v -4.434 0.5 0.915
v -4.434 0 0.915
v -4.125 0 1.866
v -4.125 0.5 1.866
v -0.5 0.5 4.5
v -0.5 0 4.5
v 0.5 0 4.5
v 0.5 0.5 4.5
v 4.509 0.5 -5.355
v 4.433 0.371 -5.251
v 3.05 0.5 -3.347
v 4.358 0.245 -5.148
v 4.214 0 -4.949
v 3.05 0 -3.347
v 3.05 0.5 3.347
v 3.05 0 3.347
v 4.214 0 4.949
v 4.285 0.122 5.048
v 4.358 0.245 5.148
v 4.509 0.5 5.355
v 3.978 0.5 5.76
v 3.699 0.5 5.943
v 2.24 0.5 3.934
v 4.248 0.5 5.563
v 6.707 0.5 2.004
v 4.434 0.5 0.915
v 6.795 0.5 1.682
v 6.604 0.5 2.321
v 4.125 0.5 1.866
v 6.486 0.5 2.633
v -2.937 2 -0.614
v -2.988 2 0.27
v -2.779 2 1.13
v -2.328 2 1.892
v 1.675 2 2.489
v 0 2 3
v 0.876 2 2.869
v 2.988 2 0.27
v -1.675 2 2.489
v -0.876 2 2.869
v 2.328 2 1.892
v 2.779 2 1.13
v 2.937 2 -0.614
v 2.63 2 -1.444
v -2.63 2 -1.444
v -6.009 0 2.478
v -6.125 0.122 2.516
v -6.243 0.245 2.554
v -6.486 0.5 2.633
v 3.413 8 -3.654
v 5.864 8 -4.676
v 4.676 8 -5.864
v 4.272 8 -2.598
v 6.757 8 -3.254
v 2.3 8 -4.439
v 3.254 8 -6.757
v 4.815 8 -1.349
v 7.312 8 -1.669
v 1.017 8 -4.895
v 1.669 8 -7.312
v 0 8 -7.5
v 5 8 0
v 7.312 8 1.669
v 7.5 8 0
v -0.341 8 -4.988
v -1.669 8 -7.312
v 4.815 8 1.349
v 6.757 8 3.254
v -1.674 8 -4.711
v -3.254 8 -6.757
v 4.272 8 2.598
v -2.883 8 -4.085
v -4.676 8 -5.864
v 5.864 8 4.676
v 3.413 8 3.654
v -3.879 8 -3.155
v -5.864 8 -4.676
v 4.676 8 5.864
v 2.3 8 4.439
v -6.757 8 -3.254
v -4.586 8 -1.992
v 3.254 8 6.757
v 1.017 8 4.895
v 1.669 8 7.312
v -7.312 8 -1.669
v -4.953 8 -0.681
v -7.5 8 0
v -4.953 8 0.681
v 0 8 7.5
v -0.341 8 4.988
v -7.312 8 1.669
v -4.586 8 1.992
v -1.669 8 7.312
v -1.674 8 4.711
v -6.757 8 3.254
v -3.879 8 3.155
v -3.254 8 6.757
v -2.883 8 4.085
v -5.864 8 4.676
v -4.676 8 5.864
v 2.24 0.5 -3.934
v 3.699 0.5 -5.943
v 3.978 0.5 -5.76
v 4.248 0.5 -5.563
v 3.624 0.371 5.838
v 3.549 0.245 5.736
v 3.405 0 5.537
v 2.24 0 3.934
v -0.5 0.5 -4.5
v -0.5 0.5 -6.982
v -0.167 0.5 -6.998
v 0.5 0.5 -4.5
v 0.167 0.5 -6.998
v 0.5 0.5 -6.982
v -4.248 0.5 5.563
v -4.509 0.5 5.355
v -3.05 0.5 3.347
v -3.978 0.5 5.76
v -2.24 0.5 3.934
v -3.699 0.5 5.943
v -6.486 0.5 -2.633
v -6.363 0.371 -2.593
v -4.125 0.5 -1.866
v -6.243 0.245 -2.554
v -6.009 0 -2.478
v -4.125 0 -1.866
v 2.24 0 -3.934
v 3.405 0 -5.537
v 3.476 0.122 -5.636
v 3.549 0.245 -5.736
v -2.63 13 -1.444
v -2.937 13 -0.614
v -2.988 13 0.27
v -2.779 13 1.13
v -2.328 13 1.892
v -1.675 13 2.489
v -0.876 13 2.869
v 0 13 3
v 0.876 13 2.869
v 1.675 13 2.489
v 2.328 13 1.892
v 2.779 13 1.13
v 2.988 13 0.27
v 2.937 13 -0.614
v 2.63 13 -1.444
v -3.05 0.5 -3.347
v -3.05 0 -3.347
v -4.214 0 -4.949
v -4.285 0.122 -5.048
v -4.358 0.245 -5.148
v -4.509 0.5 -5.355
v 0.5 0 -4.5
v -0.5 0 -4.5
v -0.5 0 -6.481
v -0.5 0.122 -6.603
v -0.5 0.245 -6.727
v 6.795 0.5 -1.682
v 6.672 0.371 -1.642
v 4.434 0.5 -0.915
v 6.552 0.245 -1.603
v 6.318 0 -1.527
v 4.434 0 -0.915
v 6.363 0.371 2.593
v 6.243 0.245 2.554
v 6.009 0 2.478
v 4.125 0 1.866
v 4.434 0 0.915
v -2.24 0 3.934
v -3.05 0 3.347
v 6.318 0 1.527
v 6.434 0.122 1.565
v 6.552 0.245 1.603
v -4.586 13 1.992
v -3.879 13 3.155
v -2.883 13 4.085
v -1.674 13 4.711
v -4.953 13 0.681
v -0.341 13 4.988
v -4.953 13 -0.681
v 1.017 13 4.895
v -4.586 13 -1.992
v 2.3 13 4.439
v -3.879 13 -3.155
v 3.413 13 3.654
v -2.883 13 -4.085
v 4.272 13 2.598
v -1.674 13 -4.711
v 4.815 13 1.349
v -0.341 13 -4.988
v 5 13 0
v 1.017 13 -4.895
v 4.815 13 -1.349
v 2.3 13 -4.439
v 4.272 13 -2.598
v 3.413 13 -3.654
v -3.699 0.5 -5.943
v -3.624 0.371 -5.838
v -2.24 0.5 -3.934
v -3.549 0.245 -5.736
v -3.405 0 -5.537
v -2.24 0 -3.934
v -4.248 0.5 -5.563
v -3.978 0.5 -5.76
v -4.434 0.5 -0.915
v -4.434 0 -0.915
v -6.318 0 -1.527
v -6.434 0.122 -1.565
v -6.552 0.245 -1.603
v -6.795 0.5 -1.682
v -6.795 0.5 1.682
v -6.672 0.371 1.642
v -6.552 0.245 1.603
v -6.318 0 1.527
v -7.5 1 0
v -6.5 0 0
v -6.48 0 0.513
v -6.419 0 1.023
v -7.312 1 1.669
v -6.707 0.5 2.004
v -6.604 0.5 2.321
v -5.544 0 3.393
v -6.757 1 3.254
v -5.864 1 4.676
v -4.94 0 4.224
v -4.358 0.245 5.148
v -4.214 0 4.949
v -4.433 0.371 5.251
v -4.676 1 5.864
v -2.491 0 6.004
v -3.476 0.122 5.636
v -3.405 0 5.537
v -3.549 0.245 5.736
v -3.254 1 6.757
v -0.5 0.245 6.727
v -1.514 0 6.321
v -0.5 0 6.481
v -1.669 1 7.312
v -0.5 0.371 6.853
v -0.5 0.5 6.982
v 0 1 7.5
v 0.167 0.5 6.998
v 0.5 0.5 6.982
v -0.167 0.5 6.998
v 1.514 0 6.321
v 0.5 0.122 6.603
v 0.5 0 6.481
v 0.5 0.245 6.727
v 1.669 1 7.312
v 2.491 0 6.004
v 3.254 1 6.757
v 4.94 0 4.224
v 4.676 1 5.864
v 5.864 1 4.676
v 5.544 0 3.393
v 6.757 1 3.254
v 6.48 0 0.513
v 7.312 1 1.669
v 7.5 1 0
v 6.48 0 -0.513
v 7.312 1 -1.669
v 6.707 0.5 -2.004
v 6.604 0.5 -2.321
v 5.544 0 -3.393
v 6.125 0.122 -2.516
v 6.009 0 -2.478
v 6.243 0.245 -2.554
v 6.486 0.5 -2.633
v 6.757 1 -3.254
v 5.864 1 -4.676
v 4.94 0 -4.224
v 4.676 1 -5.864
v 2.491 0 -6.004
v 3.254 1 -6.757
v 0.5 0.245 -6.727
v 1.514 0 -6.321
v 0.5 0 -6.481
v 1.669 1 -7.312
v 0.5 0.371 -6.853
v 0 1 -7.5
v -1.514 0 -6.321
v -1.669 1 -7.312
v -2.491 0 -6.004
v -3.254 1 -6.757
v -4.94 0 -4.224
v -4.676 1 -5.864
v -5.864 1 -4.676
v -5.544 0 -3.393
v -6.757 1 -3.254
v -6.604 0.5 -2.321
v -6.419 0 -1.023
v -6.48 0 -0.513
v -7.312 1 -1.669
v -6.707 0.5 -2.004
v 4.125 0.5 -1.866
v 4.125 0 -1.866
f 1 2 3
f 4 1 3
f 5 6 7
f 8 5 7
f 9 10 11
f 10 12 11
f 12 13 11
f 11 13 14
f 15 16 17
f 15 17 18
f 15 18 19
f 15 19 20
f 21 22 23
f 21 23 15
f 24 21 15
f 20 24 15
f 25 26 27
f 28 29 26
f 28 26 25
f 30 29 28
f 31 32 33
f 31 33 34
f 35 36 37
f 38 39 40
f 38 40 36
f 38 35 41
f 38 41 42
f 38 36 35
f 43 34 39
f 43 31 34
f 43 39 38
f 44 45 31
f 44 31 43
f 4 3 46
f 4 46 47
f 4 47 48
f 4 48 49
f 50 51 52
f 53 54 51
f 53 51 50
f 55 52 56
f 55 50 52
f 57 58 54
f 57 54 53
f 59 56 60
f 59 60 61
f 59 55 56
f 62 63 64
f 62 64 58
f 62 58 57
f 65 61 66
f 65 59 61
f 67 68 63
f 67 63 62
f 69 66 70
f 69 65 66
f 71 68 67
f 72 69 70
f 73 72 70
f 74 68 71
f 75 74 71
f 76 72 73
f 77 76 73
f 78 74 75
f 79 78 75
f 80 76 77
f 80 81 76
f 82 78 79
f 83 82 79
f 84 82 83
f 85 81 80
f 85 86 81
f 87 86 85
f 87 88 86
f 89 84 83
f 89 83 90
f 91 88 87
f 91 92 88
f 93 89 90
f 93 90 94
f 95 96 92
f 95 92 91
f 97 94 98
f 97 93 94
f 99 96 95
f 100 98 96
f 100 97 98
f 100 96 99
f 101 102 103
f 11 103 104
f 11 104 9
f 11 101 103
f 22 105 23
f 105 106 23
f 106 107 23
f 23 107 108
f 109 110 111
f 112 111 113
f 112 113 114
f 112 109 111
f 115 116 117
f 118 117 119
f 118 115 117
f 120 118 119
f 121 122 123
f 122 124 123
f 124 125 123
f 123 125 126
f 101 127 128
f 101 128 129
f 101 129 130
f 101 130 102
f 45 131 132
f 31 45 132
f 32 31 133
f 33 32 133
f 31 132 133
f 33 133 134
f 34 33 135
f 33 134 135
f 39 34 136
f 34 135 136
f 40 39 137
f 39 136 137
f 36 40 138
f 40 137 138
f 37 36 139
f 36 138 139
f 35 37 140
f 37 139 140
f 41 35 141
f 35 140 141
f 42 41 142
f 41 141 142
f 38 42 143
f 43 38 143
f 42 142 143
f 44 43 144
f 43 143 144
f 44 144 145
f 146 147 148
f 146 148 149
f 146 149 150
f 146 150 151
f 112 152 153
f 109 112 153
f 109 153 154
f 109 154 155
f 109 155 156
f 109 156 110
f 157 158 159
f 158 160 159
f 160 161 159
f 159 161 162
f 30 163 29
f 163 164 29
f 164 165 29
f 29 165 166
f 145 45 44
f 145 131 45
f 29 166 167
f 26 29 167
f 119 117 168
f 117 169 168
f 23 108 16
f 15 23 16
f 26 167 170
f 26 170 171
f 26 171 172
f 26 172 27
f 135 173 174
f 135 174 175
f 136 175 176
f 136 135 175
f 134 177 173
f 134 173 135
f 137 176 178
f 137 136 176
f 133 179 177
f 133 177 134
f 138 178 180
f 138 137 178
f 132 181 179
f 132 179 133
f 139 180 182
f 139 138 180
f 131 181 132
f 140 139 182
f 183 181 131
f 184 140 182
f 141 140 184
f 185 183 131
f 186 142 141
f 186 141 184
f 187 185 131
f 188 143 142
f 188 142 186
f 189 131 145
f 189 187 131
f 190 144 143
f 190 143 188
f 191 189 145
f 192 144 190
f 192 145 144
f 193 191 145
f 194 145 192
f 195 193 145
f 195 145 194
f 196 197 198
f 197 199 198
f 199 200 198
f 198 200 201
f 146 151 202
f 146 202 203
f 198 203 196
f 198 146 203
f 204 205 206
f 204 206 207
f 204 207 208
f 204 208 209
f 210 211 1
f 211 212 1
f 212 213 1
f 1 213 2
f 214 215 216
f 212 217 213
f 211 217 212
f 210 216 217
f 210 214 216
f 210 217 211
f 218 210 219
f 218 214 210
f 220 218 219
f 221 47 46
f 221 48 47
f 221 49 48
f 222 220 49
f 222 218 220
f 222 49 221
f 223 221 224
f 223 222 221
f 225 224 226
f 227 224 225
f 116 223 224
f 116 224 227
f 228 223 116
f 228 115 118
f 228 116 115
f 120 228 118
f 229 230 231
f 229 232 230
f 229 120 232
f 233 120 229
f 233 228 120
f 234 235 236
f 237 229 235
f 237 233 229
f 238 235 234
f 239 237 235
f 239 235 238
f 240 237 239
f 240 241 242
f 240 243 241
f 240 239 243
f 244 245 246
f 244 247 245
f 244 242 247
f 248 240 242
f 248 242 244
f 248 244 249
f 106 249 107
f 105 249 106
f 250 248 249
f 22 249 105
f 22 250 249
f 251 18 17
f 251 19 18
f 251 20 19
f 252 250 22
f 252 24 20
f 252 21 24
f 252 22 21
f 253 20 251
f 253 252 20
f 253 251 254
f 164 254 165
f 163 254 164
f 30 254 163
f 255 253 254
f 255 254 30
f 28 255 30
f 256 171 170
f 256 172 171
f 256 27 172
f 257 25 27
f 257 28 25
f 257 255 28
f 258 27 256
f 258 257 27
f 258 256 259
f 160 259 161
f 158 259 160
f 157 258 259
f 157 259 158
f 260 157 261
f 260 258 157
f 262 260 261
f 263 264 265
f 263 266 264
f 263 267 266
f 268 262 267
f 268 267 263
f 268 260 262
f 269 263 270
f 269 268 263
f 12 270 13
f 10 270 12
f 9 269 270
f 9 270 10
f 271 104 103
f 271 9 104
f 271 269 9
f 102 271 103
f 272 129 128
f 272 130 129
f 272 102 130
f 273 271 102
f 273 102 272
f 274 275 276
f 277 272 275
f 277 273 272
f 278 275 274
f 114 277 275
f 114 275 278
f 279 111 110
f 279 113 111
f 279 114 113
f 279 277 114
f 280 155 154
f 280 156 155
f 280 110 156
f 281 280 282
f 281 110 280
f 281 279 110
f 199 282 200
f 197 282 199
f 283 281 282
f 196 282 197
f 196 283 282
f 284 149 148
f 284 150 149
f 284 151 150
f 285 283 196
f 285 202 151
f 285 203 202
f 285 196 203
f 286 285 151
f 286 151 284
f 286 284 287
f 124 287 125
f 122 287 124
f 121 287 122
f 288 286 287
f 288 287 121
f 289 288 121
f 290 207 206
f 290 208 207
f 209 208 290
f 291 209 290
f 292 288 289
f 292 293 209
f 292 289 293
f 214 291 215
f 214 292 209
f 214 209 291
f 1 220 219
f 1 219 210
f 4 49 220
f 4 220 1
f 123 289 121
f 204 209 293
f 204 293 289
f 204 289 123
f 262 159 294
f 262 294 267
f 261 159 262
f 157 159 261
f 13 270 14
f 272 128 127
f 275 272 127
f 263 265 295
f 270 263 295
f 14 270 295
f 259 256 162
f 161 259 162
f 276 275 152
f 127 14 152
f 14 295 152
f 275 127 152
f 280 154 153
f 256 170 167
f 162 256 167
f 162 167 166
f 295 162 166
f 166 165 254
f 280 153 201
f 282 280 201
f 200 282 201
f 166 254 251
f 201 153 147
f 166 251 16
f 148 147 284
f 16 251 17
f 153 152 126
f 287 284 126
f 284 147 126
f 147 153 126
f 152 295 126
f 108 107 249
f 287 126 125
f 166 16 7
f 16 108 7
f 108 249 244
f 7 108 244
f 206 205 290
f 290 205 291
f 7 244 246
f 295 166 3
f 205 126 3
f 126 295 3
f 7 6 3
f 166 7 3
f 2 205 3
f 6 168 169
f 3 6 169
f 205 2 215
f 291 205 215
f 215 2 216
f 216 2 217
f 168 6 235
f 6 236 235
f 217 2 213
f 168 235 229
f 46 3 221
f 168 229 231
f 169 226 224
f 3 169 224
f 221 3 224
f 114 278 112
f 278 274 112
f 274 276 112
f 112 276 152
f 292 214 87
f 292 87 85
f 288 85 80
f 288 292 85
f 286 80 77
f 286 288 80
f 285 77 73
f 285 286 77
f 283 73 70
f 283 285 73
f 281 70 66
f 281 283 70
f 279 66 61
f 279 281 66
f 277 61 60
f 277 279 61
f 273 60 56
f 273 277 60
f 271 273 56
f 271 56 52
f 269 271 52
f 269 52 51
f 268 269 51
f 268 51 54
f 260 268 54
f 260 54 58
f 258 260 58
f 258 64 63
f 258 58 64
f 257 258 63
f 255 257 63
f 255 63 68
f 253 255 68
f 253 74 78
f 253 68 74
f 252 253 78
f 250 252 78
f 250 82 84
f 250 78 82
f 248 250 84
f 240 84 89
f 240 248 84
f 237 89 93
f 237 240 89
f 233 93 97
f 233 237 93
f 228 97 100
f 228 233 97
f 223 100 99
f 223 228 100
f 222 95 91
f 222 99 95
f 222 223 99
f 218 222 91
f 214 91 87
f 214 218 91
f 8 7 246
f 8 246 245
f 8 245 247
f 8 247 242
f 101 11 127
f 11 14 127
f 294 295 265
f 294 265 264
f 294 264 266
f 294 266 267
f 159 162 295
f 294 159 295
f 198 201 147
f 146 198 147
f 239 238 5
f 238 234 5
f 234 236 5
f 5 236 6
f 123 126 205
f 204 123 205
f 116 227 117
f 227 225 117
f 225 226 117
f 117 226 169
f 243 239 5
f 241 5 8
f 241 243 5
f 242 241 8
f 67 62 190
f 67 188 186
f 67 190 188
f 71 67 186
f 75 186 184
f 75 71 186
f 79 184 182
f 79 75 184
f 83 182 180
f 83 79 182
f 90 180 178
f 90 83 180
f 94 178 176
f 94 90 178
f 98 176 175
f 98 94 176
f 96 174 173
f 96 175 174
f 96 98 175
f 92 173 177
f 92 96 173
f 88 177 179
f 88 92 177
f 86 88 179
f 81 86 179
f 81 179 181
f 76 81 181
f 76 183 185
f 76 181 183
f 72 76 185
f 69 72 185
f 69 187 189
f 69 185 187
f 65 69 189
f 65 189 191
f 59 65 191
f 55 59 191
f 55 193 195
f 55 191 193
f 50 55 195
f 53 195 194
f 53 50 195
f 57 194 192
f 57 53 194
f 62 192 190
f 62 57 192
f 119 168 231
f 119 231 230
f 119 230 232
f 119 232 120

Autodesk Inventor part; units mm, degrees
ref_plane "YZ Plane" through (0, 0, 0) normal (1, 0, 0) x (0, 1, 0)
ref_plane "XZ Plane" through (0, 0, 0) normal (0, 1, 0) x (-1, 0, 0)
ref_plane "XY Plane" through (0, 0, 0) normal (0, 0, 1) x (1, 0, 0)
sketch "Sketch1" plane through (0, 0, 0) normal (0, 1, 0) x (-1, 0, 0)
  circle A0 centre (0, 0) radius 7.5
  dimension "d0" = 15
extrude "Extrusion1" add sketch "Sketch1" along normal blind 8
sketch "Sketch2" plane through (0, 8, 0) normal (0, 1, 0) x (1, 0, 0)
  circle A0 centre (0, 0) radius 7.5 projected
  circle A1 centre (0, 0) radius 5
  dimension "d3" = 10
extrude "Extrusion2" add sketch "Sketch2" along normal blind 5 contours A1
sketch "Sketch3" plane through (0, 13, 0) normal (0, 1, 0) x (1, 0, 0)
  circle A0 centre (0, 0) radius 5 projected
  circle A1 centre (0, 0) radius 3 construction
  line L0 (-2.6295, 1.4442) -> (2.6295, 1.4442)
  arc A2 (-2.6295, 1.4442) -> (2.6295, 1.4442) centre (0, 0) ccw
  dimension "d6" = 6
  dimension "d7" = 5.259
extrude "Extrusion3" cut sketch "Sketch3" against normal blind 11 contours L0 A2
chamfer "Chamfer1" distance 1 angle 45 1 edges at (7.5, 0, 0)
sketch "Sketch4" plane through (0, 0, 0) normal (0, -1, 0) x (1, 0, 0)
  circle A0 centre (0, 0) radius 6.5 construction
  line L0 (0, 0) -> (0, 6.5) construction
  line L1 (-0.5, 4.5) -> (0.5, 4.5)
  line L2 (0.5, 4.5) -> (0.5, 7.5)
  line L3 (0.5, 7.5) -> (-0.5, 7.5)
  line L4 (-0.5, 7.5) -> (-0.5, 4.5)
  circle A1 centre (0, 0) radius 7.5 construction
  line L5 (-3.0495, 3.3467) -> (-2.2405, 3.9345)
  line L6 (-2.2405, 3.9345) -> (-4.0039, 6.3615)
  line L7 (-4.0039, 6.3615) -> (-4.8129, 5.7737)
  line L8 (-4.8129, 5.7737) -> (-3.0495, 3.3467)
  line L9 (-4.4343, 0.915) -> (-4.1252, 1.8661)
  line L10 (-4.1252, 1.8661) -> (-6.9784, 2.7932)
  line L11 (-6.9784, 2.7932) -> (-7.2874, 1.8421)
  line L12 (-7.2874, 1.8421) -> (-4.4343, 0.915)
  line L13 (-4.1252, -1.8661) -> (-4.4343, -0.915)
  line L14 (-4.4343, -0.915) -> (-7.2874, -1.8421)
  line L15 (-7.2874, -1.8421) -> (-6.9784, -2.7932)
  line L16 (-6.9784, -2.7932) -> (-4.1252, -1.8661)
  line L17 (-2.2405, -3.9345) -> (-3.0495, -3.3467)
  line L18 (-3.0495, -3.3467) -> (-4.8129, -5.7737)
  line L19 (-4.8129, -5.7737) -> (-4.0039, -6.3615)
  line L20 (-4.0039, -6.3615) -> (-2.2405, -3.9345)
  line L21 (0.5, -4.5) -> (-0.5, -4.5)
  line L22 (-0.5, -4.5) -> (-0.5, -7.5)
  line L23 (-0.5, -7.5) -> (0.5, -7.5)
  line L24 (0.5, -7.5) -> (0.5, -4.5)
  line L25 (3.0495, -3.3467) -> (2.2405, -3.9345)
  line L26 (2.2405, -3.9345) -> (4.0039, -6.3615)
  line L27 (4.0039, -6.3615) -> (4.8129, -5.7737)
  line L28 (4.8129, -5.7737) -> (3.0495, -3.3467)
  line L29 (4.4343, -0.915) -> (4.1252, -1.8661)
  line L30 (4.1252, -1.8661) -> (6.9784, -2.7932)
  line L31 (6.9784, -2.7932) -> (7.2874, -1.8421)
  line L32 (7.2874, -1.8421) -> (4.4343, -0.915)
  line L33 (4.1252, 1.8661) -> (4.4343, 0.915)
  line L34 (4.4343, 0.915) -> (7.2874, 1.8421)
  line L35 (7.2874, 1.8421) -> (6.9784, 2.7932)
  line L36 (6.9784, 2.7932) -> (4.1252, 1.8661)
  line L37 (2.2405, 3.9345) -> (3.0495, 3.3467)
  line L38 (3.0495, 3.3467) -> (4.8129, 5.7737)
  line L39 (4.8129, 5.7737) -> (4.0039, 6.3615)
  line L40 (4.0039, 6.3615) -> (2.2405, 3.9345)
  point P0 (0, 4.5)
  point P1 (-2.645, 3.6406)
  point P2 (-4.2798, 1.3906)
  point P3 (-4.2798, -1.3906)
  point P4 (-2.645, -3.6406)
  point P5 (0, -4.5)
  point P6 (2.645, -3.6406)
  point P7 (4.2798, -1.3906)
  point P8 (4.2798, 1.3906)
  point P9 (2.645, 3.6406)
  dimension "d13" = 1
  dimension "d14" = 3
  dimension "d17" = 360
extrude "Extrusion4" cut sketch "Sketch4" against normal blind 0.5
properties part number "rotary_encoder_cnob" material "ABS Plastic"
